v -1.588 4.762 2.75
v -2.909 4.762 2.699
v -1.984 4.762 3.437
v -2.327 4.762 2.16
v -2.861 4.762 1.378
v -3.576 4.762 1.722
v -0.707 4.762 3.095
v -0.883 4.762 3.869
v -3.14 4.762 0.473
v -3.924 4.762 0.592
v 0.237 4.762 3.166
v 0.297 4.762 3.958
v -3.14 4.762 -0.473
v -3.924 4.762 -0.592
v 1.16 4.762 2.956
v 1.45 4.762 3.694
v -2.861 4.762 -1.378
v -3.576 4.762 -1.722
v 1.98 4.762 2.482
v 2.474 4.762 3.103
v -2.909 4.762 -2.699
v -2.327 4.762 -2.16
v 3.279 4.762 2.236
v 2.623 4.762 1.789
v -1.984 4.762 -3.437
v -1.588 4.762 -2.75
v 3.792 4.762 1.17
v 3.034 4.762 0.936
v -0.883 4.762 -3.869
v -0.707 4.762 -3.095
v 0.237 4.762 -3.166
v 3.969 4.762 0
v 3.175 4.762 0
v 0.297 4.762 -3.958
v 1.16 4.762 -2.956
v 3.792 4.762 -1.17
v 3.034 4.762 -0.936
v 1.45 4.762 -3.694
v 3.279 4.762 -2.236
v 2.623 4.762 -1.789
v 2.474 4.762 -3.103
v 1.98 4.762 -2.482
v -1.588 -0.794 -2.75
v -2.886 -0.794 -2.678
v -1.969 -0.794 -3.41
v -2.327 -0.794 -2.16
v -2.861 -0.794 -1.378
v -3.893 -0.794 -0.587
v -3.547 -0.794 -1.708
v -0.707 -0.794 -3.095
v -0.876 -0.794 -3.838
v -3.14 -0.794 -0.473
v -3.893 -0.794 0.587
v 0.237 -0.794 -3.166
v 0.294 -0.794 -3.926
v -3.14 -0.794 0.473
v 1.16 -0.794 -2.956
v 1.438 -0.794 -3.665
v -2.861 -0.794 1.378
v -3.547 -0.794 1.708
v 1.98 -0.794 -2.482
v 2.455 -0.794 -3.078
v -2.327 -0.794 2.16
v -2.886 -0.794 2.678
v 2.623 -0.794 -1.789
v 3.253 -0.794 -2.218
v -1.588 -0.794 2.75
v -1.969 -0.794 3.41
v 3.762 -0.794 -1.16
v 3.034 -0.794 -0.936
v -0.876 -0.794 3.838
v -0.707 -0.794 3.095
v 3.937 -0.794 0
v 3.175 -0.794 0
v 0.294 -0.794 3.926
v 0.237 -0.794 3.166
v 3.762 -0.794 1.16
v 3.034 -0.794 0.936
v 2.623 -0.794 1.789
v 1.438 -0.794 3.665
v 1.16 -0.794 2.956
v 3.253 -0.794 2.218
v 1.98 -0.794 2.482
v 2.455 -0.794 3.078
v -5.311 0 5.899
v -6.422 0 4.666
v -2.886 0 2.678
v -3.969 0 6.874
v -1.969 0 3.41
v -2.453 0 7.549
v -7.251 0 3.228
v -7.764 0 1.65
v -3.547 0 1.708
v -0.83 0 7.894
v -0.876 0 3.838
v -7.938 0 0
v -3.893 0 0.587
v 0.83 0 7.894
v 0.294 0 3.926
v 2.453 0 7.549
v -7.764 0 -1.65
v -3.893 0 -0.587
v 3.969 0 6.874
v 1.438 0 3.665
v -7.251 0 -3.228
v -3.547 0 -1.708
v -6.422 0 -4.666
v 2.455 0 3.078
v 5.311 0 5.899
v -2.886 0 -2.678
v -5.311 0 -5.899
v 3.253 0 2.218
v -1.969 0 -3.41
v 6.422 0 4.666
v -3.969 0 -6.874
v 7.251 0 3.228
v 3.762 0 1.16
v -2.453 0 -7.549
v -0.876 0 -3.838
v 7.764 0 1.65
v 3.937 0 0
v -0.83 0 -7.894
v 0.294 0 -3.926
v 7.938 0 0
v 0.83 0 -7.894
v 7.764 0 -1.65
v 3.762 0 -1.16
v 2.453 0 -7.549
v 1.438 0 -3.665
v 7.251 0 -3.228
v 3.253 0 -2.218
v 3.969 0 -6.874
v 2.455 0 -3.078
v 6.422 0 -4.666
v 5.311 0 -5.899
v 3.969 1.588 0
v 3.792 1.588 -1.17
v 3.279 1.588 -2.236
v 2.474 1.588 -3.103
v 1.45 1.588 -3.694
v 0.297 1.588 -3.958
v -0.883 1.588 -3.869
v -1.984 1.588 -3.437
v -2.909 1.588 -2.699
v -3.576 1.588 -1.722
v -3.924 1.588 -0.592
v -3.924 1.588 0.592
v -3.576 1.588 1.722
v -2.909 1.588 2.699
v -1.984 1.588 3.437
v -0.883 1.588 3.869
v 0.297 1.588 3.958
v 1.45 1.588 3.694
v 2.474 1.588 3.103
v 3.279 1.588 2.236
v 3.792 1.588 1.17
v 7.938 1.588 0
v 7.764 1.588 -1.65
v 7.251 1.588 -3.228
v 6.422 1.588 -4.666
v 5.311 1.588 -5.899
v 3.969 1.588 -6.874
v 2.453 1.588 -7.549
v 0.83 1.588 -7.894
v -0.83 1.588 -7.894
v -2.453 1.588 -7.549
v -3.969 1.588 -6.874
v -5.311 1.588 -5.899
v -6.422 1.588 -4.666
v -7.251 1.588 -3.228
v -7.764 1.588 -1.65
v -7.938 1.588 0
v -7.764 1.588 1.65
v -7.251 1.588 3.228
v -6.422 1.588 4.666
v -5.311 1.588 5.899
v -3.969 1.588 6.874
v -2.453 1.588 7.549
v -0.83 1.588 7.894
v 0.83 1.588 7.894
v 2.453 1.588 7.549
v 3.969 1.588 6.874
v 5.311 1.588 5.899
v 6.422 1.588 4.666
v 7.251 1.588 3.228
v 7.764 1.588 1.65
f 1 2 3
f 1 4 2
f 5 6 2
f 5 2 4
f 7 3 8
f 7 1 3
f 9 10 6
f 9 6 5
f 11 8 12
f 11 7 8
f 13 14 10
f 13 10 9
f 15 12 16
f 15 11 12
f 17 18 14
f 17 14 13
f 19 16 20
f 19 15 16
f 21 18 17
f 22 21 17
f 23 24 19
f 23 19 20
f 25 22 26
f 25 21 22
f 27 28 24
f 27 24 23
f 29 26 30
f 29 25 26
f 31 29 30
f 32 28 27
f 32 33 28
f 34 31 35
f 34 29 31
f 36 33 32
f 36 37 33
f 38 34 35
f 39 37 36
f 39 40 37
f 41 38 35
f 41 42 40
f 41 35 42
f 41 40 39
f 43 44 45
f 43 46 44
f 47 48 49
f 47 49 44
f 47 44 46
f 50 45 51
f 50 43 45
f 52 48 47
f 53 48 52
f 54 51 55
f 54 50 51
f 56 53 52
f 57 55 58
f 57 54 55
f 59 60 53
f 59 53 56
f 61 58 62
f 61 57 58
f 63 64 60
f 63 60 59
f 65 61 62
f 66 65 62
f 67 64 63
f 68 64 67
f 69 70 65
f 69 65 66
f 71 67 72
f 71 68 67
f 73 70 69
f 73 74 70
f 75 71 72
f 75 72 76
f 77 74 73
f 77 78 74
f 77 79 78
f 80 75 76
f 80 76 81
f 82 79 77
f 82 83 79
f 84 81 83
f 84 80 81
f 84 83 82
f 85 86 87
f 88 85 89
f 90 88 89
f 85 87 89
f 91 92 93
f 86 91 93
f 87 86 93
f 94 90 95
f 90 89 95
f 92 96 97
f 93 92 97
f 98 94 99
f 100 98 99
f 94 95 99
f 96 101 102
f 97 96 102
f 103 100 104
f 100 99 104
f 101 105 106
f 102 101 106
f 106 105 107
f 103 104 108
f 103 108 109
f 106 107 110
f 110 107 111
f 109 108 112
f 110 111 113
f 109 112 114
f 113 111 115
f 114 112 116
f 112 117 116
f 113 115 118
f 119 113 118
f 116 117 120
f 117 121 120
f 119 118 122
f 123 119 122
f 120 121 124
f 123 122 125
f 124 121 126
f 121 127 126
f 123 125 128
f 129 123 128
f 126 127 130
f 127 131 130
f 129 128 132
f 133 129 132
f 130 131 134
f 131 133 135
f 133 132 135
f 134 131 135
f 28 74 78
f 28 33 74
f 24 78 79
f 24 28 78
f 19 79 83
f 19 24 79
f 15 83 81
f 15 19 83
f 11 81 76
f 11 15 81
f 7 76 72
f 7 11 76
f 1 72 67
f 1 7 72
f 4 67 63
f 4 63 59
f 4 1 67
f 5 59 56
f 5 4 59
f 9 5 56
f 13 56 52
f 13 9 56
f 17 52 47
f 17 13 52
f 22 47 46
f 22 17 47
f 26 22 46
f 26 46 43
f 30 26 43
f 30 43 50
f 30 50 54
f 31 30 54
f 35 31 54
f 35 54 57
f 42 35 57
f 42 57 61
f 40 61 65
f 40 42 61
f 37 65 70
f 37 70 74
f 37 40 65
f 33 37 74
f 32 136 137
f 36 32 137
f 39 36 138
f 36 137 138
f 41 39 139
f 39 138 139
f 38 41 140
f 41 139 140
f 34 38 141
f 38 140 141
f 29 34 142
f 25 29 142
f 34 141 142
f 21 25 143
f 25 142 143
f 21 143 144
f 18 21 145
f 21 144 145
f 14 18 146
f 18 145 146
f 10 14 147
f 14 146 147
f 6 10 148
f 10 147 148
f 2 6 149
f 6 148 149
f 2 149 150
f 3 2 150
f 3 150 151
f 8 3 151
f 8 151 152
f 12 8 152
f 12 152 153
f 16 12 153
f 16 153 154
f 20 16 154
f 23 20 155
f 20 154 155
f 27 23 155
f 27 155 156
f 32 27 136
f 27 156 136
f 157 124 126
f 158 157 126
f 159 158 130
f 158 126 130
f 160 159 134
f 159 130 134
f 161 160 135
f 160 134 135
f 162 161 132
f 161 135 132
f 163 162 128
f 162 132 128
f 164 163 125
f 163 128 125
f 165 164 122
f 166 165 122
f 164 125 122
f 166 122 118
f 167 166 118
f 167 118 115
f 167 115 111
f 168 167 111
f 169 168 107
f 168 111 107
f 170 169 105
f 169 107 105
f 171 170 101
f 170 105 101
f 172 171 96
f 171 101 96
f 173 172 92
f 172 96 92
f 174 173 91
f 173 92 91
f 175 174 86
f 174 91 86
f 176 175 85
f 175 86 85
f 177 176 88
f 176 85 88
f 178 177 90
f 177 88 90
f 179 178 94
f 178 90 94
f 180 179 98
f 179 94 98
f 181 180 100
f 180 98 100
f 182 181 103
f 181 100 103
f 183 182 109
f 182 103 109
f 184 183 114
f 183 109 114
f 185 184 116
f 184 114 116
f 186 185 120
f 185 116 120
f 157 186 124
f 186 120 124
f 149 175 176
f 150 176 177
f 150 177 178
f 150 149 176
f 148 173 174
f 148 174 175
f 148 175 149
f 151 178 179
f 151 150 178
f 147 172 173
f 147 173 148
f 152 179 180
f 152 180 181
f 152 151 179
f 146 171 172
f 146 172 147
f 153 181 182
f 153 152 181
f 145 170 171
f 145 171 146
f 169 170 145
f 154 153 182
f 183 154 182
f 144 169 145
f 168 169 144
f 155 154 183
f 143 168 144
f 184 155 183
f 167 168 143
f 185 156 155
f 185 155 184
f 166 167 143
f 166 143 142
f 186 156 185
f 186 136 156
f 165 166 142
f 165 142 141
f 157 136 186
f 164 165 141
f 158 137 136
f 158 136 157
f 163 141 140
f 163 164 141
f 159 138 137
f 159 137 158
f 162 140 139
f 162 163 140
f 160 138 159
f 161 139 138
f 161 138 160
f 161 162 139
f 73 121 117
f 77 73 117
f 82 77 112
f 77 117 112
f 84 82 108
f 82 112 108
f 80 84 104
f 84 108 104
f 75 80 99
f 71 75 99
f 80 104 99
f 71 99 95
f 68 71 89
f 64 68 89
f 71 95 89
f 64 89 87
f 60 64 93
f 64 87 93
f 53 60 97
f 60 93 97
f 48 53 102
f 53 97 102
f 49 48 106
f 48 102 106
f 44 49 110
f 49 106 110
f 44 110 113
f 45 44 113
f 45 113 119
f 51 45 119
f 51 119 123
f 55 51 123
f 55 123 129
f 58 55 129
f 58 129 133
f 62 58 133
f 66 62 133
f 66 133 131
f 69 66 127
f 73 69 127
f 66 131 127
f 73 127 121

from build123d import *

# Parameters (mm, degrees)
SKETCH1_R           = 7.9375
SKETCH1_R_2         = 3.175
BOSS_EXTRUDE1_DEPTH = 1.5875
SKETCH2_R           = 3.96875
SKETCH2_R_2         = 3.175
BOSS_EXTRUDE2_DEPTH = 3.175
SKETCH3_R           = 3.937
SKETCH3_R_2         = 3.175
BOSS_EXTRUDE3_DEPTH = 0.79375


with BuildPart() as part:
    # Sketch1 → Boss-Extrude1 (new body)
    with BuildSketch(Plane(origin=(0, 0, 0), x_dir=(1, 0, 0), z_dir=(0, 1, 0))):
        Circle(SKETCH1_R)
        Circle(SKETCH1_R_2, mode=Mode.SUBTRACT)
    extrude(amount=BOSS_EXTRUDE1_DEPTH)

    # Sketch2 → Boss-Extrude2 (add)
    with BuildSketch(Plane(origin=(0, 1.5875, 0), x_dir=(1, 0, 0), z_dir=(0, 1, 0))):
        Circle(SKETCH2_R)
        Circle(SKETCH2_R_2, mode=Mode.SUBTRACT)
    extrude(amount=BOSS_EXTRUDE2_DEPTH)

    # Sketch3 → Boss-Extrude3 (add)
    with BuildSketch(Plane.XZ):
        Circle(SKETCH3_R)
        Circle(SKETCH3_R_2, mode=Mode.SUBTRACT)
    extrude(amount=BOSS_EXTRUDE3_DEPTH)


solid = part.part
